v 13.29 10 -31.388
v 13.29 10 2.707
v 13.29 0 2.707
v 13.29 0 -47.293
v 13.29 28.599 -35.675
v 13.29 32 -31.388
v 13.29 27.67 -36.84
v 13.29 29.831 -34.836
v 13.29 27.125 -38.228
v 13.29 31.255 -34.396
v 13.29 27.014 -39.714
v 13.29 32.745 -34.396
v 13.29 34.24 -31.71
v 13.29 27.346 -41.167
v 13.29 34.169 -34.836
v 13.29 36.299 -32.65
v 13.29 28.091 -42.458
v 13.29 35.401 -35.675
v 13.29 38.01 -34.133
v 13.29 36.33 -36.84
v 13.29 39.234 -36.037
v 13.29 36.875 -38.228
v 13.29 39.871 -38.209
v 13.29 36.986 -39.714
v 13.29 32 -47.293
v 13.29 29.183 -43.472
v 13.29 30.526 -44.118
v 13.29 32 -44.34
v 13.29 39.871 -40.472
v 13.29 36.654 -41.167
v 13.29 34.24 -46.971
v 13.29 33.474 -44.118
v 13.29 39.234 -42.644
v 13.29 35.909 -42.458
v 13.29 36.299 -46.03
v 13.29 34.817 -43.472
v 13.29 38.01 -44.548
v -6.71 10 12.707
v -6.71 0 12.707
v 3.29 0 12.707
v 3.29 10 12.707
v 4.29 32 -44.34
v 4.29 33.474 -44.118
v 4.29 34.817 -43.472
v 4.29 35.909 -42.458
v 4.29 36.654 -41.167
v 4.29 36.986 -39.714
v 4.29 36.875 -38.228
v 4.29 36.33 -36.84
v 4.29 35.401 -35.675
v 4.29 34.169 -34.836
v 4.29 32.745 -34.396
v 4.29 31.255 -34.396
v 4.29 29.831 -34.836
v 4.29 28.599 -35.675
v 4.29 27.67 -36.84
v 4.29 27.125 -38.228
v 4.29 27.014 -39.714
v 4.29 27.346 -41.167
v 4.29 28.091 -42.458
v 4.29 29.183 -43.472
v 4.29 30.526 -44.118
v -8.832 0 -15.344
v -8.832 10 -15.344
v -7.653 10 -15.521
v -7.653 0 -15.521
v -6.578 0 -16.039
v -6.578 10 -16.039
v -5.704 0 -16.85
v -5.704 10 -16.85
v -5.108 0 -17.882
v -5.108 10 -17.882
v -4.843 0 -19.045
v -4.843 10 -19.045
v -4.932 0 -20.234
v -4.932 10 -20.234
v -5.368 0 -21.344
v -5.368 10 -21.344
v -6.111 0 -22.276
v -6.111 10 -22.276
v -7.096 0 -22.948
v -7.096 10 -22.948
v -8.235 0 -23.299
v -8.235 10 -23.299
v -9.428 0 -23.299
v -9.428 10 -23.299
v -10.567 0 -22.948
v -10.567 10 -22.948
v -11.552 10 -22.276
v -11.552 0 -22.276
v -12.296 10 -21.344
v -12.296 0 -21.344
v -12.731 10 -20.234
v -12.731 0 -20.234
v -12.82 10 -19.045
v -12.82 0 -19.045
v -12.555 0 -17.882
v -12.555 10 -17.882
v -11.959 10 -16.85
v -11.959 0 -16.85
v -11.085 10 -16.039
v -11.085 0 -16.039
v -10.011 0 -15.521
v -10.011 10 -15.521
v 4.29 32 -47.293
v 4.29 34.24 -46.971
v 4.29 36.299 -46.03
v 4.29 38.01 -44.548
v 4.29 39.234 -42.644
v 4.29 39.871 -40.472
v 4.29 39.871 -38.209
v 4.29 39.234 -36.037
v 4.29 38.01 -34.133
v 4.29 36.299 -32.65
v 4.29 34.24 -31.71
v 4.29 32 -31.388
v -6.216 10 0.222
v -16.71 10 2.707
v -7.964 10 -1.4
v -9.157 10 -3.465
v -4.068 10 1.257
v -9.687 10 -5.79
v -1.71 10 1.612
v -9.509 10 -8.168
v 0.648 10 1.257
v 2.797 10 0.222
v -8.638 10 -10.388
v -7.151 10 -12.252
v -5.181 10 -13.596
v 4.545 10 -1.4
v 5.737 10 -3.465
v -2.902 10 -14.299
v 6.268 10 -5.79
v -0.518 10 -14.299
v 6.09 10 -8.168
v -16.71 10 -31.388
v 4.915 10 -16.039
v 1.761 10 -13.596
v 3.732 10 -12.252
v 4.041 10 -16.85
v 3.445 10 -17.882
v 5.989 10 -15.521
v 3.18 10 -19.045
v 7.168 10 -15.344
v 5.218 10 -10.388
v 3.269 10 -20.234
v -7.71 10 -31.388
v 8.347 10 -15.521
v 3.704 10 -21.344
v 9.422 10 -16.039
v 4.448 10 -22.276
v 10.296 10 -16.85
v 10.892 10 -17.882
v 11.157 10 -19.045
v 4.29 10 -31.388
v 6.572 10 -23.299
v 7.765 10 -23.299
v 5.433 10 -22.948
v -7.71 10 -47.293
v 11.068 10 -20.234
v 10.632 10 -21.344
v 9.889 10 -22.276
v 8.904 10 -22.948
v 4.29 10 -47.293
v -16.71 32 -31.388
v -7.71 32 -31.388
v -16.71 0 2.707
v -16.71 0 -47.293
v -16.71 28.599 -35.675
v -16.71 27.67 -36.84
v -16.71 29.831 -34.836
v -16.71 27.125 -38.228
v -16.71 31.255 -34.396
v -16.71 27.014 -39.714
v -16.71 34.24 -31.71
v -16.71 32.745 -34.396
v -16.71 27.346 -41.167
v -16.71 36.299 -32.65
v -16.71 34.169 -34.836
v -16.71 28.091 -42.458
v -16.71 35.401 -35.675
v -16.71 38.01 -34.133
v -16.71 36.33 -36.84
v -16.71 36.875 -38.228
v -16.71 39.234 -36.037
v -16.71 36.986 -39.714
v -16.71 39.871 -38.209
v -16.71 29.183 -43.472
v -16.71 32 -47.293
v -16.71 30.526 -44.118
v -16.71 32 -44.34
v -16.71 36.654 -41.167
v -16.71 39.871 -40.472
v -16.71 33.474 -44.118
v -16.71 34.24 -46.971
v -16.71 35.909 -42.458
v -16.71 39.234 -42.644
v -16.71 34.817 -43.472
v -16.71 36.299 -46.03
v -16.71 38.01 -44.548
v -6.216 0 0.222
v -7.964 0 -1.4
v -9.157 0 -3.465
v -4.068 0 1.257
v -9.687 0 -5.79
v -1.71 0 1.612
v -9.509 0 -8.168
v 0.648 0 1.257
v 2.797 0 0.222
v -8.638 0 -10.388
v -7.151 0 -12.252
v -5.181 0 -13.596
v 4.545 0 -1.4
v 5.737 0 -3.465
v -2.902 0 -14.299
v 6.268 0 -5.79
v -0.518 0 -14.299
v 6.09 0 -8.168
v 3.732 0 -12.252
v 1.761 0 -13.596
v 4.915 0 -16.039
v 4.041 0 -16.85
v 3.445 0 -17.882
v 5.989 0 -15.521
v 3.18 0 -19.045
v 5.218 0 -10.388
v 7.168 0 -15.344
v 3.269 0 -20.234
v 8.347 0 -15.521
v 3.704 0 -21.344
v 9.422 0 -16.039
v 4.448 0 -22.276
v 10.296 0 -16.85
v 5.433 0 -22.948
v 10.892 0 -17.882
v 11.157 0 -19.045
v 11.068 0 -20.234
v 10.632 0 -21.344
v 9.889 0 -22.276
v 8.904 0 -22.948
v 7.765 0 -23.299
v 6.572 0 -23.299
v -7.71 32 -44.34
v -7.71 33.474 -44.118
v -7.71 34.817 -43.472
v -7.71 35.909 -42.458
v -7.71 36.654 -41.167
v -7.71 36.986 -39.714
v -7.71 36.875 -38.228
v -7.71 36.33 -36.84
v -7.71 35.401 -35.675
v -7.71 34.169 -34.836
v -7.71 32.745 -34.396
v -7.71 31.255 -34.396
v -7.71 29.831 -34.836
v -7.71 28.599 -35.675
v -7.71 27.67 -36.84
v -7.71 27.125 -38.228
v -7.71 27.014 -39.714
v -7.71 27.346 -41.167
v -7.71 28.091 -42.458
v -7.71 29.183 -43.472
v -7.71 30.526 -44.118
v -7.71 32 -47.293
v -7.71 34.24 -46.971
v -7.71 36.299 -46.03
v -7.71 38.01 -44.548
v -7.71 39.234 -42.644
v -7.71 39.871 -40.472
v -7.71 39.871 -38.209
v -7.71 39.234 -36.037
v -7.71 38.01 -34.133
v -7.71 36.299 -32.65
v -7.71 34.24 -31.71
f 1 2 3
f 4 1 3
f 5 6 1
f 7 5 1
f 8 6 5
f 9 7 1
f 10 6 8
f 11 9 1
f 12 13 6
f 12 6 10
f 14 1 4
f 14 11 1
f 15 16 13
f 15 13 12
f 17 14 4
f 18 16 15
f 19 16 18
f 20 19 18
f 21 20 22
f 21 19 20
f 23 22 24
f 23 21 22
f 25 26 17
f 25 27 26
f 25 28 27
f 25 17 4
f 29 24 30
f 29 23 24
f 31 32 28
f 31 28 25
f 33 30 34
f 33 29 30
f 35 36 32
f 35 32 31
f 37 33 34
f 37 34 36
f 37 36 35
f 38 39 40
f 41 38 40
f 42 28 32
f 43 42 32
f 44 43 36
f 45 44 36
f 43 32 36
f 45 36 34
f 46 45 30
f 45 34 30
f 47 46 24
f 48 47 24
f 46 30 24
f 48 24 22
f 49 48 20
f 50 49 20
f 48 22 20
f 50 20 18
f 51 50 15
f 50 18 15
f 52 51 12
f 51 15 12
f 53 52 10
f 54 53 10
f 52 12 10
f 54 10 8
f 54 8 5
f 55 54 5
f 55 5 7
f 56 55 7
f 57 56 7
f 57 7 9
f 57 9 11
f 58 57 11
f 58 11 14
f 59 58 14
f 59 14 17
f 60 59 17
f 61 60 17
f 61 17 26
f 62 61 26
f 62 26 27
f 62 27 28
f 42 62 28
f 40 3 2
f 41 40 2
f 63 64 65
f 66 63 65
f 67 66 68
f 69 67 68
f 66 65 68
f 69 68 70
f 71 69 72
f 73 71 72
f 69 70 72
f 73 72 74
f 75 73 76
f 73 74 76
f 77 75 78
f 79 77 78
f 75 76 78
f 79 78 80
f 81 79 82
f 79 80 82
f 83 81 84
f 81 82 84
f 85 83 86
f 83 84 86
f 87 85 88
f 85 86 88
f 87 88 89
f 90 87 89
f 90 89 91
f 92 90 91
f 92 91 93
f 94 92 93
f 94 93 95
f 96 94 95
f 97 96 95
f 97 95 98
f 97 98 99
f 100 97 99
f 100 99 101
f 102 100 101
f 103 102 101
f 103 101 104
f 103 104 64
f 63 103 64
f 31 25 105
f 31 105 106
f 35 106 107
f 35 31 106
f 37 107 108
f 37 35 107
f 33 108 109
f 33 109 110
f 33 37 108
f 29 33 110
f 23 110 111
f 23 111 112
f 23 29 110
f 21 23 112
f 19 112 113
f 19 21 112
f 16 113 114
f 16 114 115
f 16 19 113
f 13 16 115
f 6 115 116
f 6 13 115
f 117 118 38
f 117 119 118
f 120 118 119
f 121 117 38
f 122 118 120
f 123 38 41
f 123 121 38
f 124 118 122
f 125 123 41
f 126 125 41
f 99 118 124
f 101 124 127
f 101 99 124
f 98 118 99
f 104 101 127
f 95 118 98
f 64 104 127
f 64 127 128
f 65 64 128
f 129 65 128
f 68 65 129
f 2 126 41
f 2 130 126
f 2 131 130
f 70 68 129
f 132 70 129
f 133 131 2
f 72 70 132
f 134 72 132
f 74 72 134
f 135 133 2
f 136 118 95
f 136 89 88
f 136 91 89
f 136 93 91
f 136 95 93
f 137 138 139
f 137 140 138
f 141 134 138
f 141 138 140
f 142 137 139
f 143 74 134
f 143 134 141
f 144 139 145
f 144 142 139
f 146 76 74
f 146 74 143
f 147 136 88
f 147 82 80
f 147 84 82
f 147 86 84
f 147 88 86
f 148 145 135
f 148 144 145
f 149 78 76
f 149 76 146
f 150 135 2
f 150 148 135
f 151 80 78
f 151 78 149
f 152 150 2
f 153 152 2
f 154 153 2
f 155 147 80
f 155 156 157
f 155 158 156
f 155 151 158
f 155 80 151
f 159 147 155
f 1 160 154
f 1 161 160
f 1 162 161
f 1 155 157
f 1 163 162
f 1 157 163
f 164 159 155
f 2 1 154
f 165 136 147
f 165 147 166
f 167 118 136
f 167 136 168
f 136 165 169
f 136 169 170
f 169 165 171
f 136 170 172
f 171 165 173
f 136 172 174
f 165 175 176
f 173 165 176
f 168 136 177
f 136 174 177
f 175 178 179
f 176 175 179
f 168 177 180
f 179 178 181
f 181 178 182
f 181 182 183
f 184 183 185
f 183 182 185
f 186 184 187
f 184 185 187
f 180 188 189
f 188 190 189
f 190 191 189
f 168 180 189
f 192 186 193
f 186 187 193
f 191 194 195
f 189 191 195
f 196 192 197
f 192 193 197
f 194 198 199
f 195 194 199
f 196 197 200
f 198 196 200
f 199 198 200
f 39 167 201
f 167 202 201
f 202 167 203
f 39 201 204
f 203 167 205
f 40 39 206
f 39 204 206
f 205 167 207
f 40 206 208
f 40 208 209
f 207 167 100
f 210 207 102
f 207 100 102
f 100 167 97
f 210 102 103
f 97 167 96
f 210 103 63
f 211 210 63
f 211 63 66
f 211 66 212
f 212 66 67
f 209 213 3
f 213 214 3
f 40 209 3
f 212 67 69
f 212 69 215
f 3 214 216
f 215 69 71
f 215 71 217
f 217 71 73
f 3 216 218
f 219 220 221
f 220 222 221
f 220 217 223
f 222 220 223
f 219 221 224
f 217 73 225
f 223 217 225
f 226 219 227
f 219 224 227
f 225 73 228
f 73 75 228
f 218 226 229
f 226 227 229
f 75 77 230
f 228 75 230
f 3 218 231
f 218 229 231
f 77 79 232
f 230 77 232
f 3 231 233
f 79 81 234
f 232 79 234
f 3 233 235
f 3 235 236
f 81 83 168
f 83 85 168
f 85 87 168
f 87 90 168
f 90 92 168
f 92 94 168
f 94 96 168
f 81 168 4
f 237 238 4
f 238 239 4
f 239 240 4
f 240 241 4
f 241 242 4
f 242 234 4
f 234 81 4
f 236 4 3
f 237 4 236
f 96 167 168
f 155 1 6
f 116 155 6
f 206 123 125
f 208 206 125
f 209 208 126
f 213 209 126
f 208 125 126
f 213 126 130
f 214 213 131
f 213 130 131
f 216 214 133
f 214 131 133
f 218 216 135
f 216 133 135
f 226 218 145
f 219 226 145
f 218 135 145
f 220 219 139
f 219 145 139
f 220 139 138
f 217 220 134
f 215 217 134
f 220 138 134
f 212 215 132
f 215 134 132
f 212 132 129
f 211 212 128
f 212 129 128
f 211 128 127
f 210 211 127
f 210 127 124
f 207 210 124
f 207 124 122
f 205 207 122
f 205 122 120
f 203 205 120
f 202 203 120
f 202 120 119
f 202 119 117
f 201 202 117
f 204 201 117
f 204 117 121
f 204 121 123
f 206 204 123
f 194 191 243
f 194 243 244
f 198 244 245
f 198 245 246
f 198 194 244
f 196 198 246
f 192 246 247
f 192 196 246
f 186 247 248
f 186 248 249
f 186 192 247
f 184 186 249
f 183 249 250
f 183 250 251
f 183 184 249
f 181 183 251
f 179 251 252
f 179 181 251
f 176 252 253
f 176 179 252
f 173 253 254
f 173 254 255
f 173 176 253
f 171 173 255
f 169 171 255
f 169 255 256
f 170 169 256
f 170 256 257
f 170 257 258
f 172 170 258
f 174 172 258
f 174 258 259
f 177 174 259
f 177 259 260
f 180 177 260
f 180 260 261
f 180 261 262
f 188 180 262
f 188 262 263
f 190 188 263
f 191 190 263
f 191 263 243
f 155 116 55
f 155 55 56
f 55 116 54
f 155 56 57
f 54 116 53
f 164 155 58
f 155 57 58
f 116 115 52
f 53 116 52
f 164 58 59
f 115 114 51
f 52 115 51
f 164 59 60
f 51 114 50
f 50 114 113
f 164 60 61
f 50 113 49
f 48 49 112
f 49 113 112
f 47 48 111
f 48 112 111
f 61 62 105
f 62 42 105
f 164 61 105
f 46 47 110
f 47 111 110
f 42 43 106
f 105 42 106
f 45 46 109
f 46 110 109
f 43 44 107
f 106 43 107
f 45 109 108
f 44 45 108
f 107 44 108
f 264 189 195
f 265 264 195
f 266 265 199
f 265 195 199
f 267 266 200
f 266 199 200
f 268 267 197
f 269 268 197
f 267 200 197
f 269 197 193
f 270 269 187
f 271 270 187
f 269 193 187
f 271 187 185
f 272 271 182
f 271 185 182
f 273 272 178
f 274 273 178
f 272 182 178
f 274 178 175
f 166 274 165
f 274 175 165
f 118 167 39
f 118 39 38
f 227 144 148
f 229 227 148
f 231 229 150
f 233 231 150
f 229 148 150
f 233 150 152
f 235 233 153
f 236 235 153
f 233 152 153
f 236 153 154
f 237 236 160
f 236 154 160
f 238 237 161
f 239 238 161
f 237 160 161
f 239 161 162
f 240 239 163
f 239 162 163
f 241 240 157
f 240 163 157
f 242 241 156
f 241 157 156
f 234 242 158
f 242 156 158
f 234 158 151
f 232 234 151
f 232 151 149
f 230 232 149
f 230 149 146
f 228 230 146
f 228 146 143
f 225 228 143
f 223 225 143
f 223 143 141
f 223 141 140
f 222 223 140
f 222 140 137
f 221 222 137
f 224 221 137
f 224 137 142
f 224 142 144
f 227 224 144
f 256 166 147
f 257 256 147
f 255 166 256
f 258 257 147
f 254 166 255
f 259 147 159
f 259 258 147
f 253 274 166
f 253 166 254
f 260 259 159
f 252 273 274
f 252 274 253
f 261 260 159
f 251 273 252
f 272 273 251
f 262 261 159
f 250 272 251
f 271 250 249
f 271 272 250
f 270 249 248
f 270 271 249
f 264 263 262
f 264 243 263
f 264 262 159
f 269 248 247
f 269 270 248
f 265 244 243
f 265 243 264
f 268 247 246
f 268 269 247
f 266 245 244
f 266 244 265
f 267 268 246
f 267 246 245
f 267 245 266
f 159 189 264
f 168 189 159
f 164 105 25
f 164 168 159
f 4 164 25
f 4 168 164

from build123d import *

# Parameters (mm, degrees)
SKETCH2_W           = 30
SKETCH2_H           = 60
BOSS_EXTRUDE1_DEPTH = 10
CHAMFER1_SIZE       = 10
CHAMFER2_SIZE       = 10
SKETCH3_W           = 15.904721494
SKETCH3_H           = 22
BOSS_EXTRUDE2_DEPTH = 9
CUT_EXTRUDE4_REACH  = 56.771
SKETCH5_R           = 8
SKETCH6_R           = 7.952360747
BOSS_EXTRUDE3_DEPTH = 9
CUT_EXTRUDE5_REACH  = 70.795
SKETCH8_R           = 5
CUT_EXTRUDE6_REACH  = 60.421
SKETCH9_R           = 4


with BuildPart() as part:
    # Sketch2 → Boss-Extrude1 (new body)
    with BuildSketch(Plane(origin=(0, 0, 0), x_dir=(1, 0, 0), z_dir=(0, 1, 0))):
        with Locations((-1.70984456, 17.292746114)):
            Rectangle(SKETCH2_W, SKETCH2_H)
    extrude(amount=BOSS_EXTRUDE1_DEPTH)

    # Chamfer1
    chamfer1_edges = [part.edges().sort_by_distance(p)[0] for p in [
        (-16.70984456, 5, 12.707253886),
    ]]
    chamfer(chamfer1_edges, length=CHAMFER1_SIZE)

    # Chamfer2
    chamfer2_edges = [part.edges().sort_by_distance(p)[0] for p in [
        (13.29015544, 5, 12.707253886),
    ]]
    chamfer(chamfer2_edges, length=CHAMFER2_SIZE)

    # Sketch3 → Boss-Extrude2 (add)
    with BuildSketch(Plane(origin=(13.29015544, 0, 0), x_dir=(0, 0, -1), z_dir=(1, 0, 0))):
        with Locations((39.340385367, 21)):
            Rectangle(SKETCH3_W, SKETCH3_H)
    boss_extrude2 = extrude(amount=-BOSS_EXTRUDE2_DEPTH)

    # Sketch5 → Cut-Extrude4 (cut, up to next)
    with BuildSketch(Plane(origin=(0, 10, 0), x_dir=(1, 0, 0), z_dir=(0, 1, 0)), mode=Mode.PRIVATE) as cut_extrude4_sk1:
        with Locations(Location((-1.70984456, 6.38802462, 0), (0, 0, 270))):
            Circle(SKETCH5_R)
    cut_extrude4_tool1 = extrude(cut_extrude4_sk1.sketch, amount=-CUT_EXTRUDE4_REACH, mode=Mode.PRIVATE) & part.part
    add(cut_extrude4_tool1.solids().sort_by_distance((-1.709845, 10, -6.388025))[0], mode=Mode.SUBTRACT)

    # Sketch6 → Boss-Extrude3 (add)
    with BuildSketch(Plane(origin=(13.29015544, 0, 0), x_dir=(0, 0, -1), z_dir=(1, 0, 0))):
        with Locations((39.340385367, 32)):
            Circle(SKETCH6_R)
    boss_extrude3 = extrude(amount=-BOSS_EXTRUDE3_DEPTH)

    # Sketch8 → Cut-Extrude5 (cut, up to next)
    with BuildSketch(Plane(origin=(13.29015544, 0, 0), x_dir=(0, 0, -1), z_dir=(1, 0, 0)), mode=Mode.PRIVATE) as cut_extrude5_sk1:
        with Locations((39.340385367, 32)):
            Circle(SKETCH8_R)
    cut_extrude5_tool1 = extrude(cut_extrude5_sk1.sketch, amount=-CUT_EXTRUDE5_REACH, mode=Mode.PRIVATE) & part.part
    cut_extrude5 = cut_extrude5_tool1.solids().sort_by_distance((13.290155, 32, -39.340385))[0]
    add(cut_extrude5, mode=Mode.SUBTRACT)

    # Mirror6: Boss-Extrude2, Boss-Extrude3, Cut-Extrude5 across plane
    add(boss_extrude2.mirror(Plane.ZY.offset(1.70984456)))
    add(boss_extrude3.mirror(Plane.ZY.offset(1.70984456)))
    add(cut_extrude5.mirror(Plane.ZY.offset(1.70984456)), mode=Mode.SUBTRACT)

    # Sketch9 → Cut-Extrude6 (cut, up to next)
    with BuildSketch(Plane(origin=(0, 10, 0), x_dir=(1, 0, 0), z_dir=(0, 1, 0)), mode=Mode.PRIVATE) as cut_extrude6_sk1:
        with Locations(Location((-8.831623879, 19.34363435, 0), (0, 0, 270))):
            Circle(SKETCH9_R)
    cut_extrude6_tool1 = extrude(cut_extrude6_sk1.sketch, amount=-CUT_EXTRUDE6_REACH, mode=Mode.PRIVATE) & part.part
    # Sketch9 → Cut-Extrude6 (cut, up to next)
    with BuildSketch(Plane(origin=(0, 10, 0), x_dir=(1, 0, 0), z_dir=(0, 1, 0)), mode=Mode.PRIVATE) as cut_extrude6_sk2:
        with Locations(Location((7.168376121, 19.34363435, 0), (0, 0, 270))):
            Circle(SKETCH9_R)
    cut_extrude6_tool2 = extrude(cut_extrude6_sk2.sketch, amount=-CUT_EXTRUDE6_REACH, mode=Mode.PRIVATE) & part.part
    add(cut_extrude6_tool1.solids().sort_by_distance((-8.831624, 10, -19.343634))[0], mode=Mode.SUBTRACT)
    add(cut_extrude6_tool2.solids().sort_by_distance((7.168376, 10, -19.343634))[0], mode=Mode.SUBTRACT)


solid = part.part
